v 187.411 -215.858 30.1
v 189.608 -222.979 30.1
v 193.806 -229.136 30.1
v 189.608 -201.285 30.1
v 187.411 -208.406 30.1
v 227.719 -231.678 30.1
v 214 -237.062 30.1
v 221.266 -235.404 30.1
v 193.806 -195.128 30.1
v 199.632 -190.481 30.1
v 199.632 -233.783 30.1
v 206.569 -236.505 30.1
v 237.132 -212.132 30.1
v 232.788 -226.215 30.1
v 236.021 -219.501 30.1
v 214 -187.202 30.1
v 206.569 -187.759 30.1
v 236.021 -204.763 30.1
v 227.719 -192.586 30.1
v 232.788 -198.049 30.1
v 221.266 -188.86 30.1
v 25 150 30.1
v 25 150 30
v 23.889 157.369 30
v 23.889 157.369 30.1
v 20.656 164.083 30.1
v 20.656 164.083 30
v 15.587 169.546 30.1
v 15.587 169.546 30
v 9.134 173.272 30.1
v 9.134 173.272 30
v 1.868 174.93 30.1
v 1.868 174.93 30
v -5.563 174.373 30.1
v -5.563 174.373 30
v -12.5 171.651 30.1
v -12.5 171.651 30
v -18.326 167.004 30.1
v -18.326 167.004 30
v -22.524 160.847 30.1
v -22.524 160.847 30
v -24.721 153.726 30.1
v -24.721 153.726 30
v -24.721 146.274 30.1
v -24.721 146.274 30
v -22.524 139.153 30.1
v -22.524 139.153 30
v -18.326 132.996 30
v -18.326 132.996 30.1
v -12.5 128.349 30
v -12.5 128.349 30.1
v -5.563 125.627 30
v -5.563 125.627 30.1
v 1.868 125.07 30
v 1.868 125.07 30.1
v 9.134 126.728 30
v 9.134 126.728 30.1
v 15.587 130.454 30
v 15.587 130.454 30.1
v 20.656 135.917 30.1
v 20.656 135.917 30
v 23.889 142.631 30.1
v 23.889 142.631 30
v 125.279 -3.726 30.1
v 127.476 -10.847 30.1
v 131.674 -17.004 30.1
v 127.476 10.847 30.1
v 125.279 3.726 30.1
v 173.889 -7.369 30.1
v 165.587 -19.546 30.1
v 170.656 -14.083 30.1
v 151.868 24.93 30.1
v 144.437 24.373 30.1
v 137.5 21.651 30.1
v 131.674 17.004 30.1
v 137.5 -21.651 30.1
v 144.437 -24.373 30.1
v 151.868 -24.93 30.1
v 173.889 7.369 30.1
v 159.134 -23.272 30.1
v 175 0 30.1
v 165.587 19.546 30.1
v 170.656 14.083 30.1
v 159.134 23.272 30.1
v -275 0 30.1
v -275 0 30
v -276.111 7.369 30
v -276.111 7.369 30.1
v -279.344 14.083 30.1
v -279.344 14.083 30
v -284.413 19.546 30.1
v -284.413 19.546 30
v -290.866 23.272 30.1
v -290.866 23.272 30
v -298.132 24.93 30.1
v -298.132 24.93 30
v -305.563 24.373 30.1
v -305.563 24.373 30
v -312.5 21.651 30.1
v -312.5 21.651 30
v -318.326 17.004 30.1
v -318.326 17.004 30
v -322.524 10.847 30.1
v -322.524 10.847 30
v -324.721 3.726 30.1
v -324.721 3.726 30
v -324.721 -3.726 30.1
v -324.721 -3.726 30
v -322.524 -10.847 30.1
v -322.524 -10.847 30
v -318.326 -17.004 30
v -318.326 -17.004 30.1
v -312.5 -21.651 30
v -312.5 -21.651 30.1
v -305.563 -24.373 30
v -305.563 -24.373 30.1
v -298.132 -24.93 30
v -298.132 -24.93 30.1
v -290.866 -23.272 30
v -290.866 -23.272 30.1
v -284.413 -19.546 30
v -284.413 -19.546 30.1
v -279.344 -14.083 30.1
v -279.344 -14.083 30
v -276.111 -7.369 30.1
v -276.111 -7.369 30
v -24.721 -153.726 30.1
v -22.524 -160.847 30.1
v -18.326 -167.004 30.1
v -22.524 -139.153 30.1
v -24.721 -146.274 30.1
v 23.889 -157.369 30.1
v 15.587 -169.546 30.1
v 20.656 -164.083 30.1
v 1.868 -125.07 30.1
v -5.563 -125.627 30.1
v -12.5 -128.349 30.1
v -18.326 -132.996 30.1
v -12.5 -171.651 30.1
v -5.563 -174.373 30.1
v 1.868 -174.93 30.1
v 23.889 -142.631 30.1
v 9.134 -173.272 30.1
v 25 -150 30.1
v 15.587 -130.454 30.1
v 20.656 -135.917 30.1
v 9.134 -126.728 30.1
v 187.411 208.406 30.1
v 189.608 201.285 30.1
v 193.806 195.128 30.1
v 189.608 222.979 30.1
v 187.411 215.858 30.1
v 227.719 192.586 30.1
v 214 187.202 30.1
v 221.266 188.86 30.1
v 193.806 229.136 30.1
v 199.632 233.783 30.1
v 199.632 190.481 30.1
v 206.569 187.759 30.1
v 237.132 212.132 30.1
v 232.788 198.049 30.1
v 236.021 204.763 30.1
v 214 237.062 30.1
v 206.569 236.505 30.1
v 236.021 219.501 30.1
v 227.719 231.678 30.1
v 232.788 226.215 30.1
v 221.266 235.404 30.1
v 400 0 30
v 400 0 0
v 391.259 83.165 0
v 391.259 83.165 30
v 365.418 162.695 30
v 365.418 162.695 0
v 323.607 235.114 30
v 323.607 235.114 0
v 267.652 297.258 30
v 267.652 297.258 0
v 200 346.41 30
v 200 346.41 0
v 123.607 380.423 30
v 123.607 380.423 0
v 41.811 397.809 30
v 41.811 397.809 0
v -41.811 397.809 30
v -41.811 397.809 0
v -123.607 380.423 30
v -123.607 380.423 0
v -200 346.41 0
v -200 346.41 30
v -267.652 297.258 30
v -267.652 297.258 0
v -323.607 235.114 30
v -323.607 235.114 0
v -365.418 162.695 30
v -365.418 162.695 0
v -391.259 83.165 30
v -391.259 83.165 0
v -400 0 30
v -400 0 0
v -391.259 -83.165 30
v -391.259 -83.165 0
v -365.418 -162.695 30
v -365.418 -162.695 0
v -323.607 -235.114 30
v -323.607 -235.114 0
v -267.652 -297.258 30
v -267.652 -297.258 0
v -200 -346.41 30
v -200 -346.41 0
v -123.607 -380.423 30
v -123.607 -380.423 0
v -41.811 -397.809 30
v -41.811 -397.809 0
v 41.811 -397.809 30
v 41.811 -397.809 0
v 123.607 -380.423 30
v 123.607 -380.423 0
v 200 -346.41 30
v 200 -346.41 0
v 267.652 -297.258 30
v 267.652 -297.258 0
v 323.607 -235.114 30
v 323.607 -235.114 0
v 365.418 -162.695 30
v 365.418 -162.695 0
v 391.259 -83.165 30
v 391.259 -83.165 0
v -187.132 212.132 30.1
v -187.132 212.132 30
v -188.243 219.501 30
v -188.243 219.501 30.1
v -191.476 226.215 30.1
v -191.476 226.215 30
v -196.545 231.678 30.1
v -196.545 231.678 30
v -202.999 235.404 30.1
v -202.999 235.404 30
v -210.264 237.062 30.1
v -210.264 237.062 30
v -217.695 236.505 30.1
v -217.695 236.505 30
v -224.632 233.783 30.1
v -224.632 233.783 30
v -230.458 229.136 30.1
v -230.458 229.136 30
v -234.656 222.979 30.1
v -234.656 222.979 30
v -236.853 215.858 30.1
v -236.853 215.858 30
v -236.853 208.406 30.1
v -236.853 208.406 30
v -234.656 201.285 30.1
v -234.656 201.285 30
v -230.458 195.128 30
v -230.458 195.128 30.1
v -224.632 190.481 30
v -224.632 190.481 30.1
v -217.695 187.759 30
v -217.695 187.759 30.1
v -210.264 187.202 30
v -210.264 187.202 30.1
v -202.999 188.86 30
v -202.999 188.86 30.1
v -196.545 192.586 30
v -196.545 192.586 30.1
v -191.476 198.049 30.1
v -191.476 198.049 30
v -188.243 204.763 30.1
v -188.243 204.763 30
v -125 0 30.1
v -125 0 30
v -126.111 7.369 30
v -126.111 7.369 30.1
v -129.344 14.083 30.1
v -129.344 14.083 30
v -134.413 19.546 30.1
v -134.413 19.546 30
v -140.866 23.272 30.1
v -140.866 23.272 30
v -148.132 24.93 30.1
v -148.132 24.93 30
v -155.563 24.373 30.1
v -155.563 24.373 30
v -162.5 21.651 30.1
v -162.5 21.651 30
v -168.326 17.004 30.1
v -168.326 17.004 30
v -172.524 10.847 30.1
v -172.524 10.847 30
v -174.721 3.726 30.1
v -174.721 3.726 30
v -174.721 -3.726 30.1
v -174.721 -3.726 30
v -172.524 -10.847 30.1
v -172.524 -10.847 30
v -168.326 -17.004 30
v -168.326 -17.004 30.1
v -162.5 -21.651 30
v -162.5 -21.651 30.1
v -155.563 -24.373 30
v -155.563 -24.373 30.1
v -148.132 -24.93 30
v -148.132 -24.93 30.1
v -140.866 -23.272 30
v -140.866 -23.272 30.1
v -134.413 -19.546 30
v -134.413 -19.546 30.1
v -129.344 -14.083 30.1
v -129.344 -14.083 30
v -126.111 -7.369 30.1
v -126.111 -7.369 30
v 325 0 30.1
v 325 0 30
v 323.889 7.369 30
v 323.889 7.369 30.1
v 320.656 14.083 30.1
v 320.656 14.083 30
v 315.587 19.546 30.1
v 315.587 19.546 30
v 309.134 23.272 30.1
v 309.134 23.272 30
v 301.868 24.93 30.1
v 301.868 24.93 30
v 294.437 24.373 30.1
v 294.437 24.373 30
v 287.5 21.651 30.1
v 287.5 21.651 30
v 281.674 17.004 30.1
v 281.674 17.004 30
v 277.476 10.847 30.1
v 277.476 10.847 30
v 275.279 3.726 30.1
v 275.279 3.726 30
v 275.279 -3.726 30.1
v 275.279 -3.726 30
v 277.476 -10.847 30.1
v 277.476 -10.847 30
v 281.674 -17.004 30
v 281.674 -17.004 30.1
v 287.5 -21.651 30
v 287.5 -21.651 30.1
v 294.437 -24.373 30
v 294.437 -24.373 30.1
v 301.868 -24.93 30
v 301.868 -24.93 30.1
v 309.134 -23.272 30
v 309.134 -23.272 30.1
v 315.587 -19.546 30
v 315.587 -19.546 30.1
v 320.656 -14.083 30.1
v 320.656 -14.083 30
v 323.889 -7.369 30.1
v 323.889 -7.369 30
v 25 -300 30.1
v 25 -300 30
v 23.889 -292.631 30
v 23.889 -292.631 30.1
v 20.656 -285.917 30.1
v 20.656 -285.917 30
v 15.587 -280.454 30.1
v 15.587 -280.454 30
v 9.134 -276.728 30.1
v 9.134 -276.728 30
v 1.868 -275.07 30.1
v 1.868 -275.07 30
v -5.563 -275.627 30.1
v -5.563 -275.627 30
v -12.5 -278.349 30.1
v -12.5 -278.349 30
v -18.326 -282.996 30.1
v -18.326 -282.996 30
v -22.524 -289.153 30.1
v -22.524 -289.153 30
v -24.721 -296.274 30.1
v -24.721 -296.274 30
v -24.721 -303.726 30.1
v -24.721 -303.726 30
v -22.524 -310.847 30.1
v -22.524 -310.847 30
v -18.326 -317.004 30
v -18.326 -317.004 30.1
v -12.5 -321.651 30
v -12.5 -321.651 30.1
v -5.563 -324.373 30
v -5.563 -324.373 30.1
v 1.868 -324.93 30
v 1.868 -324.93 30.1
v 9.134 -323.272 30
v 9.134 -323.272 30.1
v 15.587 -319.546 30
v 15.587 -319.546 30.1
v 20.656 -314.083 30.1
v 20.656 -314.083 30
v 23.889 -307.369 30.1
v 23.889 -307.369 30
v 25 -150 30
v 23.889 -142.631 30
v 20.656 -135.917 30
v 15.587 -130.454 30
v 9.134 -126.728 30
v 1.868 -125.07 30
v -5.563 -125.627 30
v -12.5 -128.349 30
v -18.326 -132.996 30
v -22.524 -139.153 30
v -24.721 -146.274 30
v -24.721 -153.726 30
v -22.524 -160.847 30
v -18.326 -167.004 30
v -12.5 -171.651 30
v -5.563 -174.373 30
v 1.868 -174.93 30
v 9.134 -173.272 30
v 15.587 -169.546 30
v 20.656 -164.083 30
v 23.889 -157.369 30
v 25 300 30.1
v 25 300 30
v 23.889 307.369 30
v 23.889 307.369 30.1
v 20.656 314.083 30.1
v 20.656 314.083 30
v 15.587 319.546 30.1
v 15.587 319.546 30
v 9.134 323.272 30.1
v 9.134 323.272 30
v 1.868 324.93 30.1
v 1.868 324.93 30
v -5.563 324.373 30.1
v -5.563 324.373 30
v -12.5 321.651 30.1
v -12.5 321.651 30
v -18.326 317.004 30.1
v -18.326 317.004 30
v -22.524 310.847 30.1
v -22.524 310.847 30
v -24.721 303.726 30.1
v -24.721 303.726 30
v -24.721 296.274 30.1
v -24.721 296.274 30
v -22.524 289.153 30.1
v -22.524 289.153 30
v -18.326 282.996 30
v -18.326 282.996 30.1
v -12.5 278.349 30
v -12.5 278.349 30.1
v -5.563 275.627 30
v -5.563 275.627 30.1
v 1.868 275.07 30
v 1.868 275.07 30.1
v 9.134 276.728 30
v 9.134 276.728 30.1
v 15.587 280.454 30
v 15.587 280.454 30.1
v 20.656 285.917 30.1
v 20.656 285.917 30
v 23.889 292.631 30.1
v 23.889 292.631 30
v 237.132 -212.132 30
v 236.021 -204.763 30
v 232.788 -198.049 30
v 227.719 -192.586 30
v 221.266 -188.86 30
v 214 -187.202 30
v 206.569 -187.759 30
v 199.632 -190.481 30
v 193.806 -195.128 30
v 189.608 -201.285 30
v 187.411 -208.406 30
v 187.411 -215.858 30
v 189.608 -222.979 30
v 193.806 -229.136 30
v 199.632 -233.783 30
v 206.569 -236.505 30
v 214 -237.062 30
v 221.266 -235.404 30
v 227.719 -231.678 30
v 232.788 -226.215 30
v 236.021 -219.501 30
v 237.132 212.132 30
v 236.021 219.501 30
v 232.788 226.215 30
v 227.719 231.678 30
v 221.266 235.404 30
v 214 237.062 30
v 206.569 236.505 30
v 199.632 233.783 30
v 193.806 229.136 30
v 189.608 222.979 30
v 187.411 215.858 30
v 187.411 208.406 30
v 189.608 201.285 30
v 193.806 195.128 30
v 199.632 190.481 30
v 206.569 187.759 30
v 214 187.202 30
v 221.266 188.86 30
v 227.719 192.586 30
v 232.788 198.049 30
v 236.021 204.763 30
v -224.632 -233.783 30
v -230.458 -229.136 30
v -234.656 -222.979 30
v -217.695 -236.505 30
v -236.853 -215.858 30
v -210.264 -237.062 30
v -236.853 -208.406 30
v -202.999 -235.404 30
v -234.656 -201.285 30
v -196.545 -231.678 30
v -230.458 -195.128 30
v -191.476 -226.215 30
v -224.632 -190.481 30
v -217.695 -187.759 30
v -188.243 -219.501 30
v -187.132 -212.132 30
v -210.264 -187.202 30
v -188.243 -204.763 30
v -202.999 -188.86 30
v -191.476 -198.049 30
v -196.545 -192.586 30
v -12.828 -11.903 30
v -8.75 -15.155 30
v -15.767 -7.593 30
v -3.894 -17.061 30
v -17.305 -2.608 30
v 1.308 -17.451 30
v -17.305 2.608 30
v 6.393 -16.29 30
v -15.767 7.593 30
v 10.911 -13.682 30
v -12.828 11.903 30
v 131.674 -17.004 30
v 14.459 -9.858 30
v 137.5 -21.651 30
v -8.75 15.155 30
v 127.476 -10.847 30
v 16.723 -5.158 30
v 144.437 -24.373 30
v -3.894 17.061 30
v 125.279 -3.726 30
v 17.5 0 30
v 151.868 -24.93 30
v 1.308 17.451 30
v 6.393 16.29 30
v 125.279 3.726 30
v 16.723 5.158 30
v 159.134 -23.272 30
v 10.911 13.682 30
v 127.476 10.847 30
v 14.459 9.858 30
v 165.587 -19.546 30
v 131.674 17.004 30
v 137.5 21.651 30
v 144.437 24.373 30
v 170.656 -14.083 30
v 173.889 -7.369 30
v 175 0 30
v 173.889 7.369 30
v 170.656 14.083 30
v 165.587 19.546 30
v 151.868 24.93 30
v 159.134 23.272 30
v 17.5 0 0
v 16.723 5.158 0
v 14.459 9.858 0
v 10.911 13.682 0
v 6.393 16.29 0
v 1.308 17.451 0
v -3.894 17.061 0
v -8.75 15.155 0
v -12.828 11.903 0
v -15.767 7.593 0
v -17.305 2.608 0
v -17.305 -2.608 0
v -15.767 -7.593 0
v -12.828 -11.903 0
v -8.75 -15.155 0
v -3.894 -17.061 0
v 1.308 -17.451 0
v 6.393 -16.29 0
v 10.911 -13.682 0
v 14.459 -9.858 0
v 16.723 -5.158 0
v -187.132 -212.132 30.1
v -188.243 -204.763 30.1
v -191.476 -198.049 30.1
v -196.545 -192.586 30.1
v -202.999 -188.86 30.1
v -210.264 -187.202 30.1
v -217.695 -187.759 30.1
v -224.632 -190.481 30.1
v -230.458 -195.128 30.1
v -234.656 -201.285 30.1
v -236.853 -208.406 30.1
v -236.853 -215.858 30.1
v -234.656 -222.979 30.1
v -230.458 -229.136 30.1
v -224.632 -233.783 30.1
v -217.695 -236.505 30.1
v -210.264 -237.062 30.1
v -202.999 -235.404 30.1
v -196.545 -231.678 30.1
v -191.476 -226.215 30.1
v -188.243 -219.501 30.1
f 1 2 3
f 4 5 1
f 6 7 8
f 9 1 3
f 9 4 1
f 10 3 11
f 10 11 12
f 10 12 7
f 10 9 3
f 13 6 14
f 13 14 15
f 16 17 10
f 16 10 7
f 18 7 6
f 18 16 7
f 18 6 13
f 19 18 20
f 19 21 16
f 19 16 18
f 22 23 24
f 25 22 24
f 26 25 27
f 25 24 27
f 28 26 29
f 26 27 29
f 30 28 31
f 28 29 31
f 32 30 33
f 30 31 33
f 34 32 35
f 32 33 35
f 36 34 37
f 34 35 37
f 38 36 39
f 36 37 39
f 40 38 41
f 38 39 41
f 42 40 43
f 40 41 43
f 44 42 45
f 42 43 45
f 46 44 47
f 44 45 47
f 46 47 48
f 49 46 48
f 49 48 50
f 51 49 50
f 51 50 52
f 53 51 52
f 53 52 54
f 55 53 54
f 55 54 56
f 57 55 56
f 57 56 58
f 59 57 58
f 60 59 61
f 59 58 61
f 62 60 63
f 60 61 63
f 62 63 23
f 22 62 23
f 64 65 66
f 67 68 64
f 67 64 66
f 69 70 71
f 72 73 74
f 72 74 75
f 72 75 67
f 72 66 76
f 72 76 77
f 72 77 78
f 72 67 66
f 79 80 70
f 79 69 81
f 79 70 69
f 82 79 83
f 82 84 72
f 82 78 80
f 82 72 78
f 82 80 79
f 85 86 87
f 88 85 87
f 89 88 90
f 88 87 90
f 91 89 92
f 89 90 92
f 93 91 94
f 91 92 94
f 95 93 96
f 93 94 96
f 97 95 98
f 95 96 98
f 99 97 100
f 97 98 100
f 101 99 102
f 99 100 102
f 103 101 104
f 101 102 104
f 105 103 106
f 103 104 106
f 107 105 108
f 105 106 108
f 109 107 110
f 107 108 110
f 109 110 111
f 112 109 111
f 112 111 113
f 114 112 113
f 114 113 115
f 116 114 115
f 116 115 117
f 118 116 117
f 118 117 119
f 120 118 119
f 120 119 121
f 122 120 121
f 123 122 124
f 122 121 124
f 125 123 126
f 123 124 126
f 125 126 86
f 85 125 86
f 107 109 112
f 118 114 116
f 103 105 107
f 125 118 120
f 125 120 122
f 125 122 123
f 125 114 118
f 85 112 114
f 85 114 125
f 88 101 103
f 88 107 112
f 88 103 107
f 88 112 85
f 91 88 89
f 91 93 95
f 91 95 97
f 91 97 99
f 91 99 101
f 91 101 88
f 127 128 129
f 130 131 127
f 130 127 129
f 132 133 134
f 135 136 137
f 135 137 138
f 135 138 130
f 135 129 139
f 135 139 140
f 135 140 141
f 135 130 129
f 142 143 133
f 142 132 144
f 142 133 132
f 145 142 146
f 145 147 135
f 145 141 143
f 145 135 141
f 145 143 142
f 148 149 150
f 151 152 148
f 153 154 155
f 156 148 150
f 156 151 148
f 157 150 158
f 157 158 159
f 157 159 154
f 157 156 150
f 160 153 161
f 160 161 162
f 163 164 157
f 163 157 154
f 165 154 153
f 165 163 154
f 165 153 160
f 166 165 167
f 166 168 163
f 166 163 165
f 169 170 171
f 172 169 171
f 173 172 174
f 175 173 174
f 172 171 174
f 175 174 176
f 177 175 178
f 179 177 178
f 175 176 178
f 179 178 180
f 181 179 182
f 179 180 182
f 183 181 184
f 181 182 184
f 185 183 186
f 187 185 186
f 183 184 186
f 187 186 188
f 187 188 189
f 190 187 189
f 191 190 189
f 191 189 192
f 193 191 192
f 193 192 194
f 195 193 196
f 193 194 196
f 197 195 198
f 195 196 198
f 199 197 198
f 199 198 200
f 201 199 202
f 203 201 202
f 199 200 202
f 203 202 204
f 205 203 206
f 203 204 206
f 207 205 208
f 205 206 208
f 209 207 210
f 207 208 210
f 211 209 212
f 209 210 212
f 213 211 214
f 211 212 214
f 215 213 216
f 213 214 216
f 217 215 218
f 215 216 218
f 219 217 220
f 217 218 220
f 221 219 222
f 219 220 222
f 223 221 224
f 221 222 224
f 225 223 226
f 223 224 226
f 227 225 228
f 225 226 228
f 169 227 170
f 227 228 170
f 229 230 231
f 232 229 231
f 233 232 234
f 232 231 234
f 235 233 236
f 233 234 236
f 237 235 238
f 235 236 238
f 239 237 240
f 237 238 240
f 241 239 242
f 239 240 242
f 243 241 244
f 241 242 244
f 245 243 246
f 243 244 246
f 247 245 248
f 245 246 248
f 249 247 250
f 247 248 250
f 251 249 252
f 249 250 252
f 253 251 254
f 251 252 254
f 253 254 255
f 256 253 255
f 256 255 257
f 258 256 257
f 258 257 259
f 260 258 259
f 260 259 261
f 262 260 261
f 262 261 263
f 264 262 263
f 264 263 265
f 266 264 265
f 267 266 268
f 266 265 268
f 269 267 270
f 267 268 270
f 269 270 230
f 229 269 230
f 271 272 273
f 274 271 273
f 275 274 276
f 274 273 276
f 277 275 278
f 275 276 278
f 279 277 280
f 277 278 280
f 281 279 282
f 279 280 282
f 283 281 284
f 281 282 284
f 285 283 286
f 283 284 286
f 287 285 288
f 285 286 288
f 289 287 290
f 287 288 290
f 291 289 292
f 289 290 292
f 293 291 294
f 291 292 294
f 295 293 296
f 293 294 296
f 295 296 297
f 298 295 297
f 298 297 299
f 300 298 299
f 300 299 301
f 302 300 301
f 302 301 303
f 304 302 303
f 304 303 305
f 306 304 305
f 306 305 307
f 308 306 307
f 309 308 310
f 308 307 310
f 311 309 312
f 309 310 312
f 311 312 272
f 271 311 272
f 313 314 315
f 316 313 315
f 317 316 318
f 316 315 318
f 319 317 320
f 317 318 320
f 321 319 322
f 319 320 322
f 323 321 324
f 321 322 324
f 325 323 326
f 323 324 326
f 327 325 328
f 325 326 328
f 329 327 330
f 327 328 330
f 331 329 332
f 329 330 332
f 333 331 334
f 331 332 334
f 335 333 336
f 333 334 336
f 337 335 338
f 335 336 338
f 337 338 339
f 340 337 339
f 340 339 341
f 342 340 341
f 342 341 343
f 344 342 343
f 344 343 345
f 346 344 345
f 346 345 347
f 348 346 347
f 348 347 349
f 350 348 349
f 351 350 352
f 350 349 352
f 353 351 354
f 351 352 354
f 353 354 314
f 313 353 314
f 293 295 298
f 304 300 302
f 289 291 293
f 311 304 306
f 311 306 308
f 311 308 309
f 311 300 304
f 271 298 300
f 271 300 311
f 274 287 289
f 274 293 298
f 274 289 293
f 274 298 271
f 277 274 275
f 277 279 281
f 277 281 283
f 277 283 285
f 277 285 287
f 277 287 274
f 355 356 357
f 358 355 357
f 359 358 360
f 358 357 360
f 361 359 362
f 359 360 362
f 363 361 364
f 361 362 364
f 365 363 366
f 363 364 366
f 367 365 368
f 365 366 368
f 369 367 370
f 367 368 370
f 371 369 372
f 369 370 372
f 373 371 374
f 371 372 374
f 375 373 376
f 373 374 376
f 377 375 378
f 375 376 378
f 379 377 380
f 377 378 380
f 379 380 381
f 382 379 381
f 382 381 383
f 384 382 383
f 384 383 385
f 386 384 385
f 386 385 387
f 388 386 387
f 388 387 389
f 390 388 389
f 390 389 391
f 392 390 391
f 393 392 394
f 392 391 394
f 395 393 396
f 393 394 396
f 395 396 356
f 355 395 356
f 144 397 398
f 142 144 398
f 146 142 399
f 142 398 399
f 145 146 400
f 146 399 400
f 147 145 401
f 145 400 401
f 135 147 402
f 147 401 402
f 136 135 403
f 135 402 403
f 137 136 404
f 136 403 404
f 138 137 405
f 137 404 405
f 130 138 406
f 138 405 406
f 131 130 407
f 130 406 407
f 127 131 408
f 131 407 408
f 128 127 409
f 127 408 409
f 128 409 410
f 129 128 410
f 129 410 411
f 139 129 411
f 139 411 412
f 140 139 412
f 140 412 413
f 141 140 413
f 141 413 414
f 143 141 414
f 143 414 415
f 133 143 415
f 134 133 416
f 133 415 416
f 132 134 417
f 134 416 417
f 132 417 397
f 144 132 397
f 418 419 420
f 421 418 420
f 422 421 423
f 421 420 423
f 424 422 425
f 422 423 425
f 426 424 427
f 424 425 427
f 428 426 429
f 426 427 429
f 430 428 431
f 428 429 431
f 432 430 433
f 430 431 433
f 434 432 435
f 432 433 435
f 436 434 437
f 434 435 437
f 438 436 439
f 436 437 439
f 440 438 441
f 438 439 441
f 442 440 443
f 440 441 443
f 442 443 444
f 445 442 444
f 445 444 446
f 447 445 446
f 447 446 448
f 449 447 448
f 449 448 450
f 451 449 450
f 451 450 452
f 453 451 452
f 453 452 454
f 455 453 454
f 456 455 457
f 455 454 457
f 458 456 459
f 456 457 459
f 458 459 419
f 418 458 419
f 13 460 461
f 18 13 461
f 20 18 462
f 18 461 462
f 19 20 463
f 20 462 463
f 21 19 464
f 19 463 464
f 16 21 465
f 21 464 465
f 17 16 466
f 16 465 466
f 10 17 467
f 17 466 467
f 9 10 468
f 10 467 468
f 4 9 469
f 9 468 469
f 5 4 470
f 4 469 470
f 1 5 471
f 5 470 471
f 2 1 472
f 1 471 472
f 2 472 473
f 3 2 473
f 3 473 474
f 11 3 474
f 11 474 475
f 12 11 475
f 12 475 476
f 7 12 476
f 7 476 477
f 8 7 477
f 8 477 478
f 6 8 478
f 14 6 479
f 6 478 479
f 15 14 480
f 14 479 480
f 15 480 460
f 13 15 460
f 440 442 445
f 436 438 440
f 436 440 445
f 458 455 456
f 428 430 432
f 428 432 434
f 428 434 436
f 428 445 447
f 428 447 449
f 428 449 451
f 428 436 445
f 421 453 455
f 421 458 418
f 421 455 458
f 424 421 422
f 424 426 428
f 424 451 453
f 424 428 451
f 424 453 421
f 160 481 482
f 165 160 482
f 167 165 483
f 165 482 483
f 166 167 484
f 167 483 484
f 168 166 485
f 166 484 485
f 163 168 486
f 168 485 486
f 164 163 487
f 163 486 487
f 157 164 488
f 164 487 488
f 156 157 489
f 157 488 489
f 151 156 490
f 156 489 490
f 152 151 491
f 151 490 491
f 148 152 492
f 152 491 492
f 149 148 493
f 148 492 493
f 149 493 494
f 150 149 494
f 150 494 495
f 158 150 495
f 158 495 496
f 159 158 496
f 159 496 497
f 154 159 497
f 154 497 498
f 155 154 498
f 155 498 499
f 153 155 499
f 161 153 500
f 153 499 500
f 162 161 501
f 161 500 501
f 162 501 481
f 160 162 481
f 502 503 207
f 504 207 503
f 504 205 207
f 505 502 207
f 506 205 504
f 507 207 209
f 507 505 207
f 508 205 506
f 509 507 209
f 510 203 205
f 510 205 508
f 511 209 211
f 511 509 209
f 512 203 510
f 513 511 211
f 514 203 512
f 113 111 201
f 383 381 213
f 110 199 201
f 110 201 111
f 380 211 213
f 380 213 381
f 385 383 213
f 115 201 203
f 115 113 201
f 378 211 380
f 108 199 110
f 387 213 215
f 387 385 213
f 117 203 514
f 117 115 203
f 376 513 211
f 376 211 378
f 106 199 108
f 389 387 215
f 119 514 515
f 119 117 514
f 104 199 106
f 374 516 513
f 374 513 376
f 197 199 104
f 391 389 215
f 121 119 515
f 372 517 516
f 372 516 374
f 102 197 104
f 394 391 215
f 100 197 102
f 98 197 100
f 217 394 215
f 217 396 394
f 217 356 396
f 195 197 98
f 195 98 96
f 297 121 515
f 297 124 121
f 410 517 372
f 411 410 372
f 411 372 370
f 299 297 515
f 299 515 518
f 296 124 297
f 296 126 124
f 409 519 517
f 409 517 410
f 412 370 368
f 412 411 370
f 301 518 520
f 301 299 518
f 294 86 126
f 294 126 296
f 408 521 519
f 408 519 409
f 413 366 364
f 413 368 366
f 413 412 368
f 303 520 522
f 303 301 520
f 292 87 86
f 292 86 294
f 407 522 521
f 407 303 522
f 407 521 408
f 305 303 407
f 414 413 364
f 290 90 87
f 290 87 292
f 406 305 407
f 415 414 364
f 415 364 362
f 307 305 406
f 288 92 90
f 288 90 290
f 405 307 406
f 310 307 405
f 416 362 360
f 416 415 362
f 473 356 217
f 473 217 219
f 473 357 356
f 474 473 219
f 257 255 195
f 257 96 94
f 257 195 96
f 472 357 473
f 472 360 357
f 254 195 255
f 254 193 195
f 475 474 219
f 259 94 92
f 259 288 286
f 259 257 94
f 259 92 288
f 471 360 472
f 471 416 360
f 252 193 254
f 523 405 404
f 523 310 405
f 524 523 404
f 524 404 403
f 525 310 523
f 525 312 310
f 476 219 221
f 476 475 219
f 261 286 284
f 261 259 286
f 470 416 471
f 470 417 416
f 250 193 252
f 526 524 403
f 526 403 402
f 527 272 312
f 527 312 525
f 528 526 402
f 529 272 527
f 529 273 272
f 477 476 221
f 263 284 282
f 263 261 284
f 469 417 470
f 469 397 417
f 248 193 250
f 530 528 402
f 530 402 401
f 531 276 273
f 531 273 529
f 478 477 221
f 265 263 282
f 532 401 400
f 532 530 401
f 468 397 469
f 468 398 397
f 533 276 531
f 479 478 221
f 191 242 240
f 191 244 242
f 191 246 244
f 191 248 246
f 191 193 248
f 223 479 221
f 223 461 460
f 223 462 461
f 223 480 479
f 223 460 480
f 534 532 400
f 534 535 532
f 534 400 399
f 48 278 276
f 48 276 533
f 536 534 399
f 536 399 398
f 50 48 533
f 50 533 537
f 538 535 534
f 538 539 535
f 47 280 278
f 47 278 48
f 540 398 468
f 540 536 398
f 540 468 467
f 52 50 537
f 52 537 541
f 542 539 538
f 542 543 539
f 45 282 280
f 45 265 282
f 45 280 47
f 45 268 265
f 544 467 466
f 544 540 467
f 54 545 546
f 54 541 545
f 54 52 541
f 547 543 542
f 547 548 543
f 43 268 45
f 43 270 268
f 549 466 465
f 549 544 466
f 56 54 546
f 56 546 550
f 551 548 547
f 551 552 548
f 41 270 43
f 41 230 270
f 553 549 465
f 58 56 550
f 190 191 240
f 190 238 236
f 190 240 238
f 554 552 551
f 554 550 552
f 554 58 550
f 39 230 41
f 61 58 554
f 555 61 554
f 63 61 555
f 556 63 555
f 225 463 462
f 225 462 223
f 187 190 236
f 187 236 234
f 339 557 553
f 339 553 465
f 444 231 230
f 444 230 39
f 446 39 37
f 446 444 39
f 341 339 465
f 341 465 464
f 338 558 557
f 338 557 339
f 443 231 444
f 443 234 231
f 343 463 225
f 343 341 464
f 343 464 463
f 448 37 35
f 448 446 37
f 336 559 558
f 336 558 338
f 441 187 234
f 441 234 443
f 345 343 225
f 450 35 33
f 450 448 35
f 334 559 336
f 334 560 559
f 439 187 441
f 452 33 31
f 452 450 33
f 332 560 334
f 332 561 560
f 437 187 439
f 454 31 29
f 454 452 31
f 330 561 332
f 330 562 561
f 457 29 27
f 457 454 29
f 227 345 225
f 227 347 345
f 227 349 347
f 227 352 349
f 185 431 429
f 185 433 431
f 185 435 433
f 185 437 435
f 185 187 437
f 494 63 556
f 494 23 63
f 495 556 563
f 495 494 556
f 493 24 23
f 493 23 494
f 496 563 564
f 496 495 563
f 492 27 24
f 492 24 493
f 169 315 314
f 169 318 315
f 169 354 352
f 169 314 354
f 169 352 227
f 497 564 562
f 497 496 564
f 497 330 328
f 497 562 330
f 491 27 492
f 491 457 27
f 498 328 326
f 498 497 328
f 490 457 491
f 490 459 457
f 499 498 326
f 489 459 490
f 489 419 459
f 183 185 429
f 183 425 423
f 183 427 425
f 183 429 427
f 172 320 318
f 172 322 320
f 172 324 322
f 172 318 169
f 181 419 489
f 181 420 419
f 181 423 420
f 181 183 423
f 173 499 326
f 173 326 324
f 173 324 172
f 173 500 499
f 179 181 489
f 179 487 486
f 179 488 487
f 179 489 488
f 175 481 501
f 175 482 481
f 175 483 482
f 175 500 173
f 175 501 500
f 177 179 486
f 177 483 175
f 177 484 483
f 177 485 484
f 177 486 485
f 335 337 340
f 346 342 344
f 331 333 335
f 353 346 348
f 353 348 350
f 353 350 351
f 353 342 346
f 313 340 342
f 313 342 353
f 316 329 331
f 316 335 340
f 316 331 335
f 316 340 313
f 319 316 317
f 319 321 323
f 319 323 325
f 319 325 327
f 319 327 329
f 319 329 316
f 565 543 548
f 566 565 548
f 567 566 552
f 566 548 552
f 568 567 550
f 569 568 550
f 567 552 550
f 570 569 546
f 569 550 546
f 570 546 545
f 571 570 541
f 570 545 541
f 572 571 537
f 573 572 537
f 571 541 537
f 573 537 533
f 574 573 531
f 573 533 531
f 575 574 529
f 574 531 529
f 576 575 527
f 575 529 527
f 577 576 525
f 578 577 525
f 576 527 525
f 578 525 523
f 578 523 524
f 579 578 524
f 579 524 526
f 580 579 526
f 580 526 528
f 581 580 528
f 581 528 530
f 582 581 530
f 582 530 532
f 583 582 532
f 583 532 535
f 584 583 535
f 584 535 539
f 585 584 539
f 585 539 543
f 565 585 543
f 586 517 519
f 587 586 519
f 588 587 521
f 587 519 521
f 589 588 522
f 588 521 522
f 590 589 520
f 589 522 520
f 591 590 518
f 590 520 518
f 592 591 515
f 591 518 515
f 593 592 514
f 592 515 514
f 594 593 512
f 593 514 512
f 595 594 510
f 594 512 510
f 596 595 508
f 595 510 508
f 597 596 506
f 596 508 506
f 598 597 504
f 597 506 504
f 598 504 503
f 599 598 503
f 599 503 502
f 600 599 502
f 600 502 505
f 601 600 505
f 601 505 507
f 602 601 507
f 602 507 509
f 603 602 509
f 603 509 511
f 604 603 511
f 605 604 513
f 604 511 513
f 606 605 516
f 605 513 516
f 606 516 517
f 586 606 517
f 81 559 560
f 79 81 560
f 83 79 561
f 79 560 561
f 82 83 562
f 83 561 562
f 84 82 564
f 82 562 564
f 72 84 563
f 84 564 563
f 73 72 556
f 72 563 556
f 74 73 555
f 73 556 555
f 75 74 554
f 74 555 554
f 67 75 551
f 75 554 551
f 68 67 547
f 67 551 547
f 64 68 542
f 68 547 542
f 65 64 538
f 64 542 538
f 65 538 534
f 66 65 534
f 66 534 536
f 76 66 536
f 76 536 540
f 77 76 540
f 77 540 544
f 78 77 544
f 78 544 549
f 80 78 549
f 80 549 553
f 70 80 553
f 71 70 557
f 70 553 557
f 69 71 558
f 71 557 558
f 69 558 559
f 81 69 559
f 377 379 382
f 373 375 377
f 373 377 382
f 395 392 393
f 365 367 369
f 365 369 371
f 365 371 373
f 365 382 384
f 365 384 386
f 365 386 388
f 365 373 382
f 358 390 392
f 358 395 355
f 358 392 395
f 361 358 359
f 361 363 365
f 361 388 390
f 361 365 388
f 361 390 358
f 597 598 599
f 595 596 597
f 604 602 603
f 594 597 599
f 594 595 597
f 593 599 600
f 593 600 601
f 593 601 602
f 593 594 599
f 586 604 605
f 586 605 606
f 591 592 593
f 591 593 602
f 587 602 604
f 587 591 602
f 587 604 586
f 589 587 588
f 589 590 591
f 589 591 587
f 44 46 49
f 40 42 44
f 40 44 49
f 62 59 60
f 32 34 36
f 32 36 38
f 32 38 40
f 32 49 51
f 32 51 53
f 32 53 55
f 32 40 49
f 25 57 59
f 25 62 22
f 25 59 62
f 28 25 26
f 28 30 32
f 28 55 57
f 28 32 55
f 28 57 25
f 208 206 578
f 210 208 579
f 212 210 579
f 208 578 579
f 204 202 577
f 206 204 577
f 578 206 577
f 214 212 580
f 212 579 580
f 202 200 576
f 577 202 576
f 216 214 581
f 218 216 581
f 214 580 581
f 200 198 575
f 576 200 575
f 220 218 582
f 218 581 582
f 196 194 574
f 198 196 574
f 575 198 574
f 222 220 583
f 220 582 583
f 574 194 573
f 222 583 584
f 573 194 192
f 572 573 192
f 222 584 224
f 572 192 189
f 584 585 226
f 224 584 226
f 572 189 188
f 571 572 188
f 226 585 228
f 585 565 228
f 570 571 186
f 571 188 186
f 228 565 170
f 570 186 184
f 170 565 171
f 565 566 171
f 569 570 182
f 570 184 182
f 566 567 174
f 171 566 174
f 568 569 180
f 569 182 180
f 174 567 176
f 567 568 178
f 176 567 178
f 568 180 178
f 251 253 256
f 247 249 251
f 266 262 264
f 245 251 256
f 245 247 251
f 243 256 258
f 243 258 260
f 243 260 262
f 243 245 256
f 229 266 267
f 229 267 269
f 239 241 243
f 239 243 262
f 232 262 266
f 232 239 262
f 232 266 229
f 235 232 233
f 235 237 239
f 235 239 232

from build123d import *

# Parameters (mm, degrees)
F0_R     = 400
F1_DEPTH = 30
F3_R     = 25
F4_DEPTH = 0.1
F5_R     = 17.5
F6_DEPTH = 60


with BuildPart() as f1:
    # F0 (on Top) → F1 (new body)
    with BuildSketch(Plane.XY):
        Circle(F0_R)
    extrude(amount=F1_DEPTH)

    # F3 (on face) → F4 (join)
    with BuildSketch(Plane.XY.offset(30)):
        with Locations((212.132034, 212.132034)):
            Circle(F3_R)
        with Locations((212.132034, -212.132034)):
            Circle(F3_R)
        with Locations((-212.132034, -212.132034)):
            Circle(F3_R)
        with Locations((-212.132034, 212.132034)):
            Circle(F3_R)
        with Locations((0, 150)):
            Circle(F3_R)
        with Locations((0, -150)):
            Circle(F3_R)
        with Locations((150, 0)):
            Circle(F3_R)
        with Locations((-150, 0)):
            Circle(F3_R)
        with Locations((0, 300)):
            Circle(F3_R)
        with Locations((300, 0)):
            Circle(F3_R)
        with Locations((0, -300)):
            Circle(F3_R)
        with Locations((-300, 0)):
            Circle(F3_R)
    extrude(amount=F4_DEPTH)

    # F5 (on face) → F6 (cut)
    with BuildSketch(Plane.XY.offset(30)):
        Circle(F5_R)
    extrude(amount=-F6_DEPTH, mode=Mode.SUBTRACT)


solid = f1.part
